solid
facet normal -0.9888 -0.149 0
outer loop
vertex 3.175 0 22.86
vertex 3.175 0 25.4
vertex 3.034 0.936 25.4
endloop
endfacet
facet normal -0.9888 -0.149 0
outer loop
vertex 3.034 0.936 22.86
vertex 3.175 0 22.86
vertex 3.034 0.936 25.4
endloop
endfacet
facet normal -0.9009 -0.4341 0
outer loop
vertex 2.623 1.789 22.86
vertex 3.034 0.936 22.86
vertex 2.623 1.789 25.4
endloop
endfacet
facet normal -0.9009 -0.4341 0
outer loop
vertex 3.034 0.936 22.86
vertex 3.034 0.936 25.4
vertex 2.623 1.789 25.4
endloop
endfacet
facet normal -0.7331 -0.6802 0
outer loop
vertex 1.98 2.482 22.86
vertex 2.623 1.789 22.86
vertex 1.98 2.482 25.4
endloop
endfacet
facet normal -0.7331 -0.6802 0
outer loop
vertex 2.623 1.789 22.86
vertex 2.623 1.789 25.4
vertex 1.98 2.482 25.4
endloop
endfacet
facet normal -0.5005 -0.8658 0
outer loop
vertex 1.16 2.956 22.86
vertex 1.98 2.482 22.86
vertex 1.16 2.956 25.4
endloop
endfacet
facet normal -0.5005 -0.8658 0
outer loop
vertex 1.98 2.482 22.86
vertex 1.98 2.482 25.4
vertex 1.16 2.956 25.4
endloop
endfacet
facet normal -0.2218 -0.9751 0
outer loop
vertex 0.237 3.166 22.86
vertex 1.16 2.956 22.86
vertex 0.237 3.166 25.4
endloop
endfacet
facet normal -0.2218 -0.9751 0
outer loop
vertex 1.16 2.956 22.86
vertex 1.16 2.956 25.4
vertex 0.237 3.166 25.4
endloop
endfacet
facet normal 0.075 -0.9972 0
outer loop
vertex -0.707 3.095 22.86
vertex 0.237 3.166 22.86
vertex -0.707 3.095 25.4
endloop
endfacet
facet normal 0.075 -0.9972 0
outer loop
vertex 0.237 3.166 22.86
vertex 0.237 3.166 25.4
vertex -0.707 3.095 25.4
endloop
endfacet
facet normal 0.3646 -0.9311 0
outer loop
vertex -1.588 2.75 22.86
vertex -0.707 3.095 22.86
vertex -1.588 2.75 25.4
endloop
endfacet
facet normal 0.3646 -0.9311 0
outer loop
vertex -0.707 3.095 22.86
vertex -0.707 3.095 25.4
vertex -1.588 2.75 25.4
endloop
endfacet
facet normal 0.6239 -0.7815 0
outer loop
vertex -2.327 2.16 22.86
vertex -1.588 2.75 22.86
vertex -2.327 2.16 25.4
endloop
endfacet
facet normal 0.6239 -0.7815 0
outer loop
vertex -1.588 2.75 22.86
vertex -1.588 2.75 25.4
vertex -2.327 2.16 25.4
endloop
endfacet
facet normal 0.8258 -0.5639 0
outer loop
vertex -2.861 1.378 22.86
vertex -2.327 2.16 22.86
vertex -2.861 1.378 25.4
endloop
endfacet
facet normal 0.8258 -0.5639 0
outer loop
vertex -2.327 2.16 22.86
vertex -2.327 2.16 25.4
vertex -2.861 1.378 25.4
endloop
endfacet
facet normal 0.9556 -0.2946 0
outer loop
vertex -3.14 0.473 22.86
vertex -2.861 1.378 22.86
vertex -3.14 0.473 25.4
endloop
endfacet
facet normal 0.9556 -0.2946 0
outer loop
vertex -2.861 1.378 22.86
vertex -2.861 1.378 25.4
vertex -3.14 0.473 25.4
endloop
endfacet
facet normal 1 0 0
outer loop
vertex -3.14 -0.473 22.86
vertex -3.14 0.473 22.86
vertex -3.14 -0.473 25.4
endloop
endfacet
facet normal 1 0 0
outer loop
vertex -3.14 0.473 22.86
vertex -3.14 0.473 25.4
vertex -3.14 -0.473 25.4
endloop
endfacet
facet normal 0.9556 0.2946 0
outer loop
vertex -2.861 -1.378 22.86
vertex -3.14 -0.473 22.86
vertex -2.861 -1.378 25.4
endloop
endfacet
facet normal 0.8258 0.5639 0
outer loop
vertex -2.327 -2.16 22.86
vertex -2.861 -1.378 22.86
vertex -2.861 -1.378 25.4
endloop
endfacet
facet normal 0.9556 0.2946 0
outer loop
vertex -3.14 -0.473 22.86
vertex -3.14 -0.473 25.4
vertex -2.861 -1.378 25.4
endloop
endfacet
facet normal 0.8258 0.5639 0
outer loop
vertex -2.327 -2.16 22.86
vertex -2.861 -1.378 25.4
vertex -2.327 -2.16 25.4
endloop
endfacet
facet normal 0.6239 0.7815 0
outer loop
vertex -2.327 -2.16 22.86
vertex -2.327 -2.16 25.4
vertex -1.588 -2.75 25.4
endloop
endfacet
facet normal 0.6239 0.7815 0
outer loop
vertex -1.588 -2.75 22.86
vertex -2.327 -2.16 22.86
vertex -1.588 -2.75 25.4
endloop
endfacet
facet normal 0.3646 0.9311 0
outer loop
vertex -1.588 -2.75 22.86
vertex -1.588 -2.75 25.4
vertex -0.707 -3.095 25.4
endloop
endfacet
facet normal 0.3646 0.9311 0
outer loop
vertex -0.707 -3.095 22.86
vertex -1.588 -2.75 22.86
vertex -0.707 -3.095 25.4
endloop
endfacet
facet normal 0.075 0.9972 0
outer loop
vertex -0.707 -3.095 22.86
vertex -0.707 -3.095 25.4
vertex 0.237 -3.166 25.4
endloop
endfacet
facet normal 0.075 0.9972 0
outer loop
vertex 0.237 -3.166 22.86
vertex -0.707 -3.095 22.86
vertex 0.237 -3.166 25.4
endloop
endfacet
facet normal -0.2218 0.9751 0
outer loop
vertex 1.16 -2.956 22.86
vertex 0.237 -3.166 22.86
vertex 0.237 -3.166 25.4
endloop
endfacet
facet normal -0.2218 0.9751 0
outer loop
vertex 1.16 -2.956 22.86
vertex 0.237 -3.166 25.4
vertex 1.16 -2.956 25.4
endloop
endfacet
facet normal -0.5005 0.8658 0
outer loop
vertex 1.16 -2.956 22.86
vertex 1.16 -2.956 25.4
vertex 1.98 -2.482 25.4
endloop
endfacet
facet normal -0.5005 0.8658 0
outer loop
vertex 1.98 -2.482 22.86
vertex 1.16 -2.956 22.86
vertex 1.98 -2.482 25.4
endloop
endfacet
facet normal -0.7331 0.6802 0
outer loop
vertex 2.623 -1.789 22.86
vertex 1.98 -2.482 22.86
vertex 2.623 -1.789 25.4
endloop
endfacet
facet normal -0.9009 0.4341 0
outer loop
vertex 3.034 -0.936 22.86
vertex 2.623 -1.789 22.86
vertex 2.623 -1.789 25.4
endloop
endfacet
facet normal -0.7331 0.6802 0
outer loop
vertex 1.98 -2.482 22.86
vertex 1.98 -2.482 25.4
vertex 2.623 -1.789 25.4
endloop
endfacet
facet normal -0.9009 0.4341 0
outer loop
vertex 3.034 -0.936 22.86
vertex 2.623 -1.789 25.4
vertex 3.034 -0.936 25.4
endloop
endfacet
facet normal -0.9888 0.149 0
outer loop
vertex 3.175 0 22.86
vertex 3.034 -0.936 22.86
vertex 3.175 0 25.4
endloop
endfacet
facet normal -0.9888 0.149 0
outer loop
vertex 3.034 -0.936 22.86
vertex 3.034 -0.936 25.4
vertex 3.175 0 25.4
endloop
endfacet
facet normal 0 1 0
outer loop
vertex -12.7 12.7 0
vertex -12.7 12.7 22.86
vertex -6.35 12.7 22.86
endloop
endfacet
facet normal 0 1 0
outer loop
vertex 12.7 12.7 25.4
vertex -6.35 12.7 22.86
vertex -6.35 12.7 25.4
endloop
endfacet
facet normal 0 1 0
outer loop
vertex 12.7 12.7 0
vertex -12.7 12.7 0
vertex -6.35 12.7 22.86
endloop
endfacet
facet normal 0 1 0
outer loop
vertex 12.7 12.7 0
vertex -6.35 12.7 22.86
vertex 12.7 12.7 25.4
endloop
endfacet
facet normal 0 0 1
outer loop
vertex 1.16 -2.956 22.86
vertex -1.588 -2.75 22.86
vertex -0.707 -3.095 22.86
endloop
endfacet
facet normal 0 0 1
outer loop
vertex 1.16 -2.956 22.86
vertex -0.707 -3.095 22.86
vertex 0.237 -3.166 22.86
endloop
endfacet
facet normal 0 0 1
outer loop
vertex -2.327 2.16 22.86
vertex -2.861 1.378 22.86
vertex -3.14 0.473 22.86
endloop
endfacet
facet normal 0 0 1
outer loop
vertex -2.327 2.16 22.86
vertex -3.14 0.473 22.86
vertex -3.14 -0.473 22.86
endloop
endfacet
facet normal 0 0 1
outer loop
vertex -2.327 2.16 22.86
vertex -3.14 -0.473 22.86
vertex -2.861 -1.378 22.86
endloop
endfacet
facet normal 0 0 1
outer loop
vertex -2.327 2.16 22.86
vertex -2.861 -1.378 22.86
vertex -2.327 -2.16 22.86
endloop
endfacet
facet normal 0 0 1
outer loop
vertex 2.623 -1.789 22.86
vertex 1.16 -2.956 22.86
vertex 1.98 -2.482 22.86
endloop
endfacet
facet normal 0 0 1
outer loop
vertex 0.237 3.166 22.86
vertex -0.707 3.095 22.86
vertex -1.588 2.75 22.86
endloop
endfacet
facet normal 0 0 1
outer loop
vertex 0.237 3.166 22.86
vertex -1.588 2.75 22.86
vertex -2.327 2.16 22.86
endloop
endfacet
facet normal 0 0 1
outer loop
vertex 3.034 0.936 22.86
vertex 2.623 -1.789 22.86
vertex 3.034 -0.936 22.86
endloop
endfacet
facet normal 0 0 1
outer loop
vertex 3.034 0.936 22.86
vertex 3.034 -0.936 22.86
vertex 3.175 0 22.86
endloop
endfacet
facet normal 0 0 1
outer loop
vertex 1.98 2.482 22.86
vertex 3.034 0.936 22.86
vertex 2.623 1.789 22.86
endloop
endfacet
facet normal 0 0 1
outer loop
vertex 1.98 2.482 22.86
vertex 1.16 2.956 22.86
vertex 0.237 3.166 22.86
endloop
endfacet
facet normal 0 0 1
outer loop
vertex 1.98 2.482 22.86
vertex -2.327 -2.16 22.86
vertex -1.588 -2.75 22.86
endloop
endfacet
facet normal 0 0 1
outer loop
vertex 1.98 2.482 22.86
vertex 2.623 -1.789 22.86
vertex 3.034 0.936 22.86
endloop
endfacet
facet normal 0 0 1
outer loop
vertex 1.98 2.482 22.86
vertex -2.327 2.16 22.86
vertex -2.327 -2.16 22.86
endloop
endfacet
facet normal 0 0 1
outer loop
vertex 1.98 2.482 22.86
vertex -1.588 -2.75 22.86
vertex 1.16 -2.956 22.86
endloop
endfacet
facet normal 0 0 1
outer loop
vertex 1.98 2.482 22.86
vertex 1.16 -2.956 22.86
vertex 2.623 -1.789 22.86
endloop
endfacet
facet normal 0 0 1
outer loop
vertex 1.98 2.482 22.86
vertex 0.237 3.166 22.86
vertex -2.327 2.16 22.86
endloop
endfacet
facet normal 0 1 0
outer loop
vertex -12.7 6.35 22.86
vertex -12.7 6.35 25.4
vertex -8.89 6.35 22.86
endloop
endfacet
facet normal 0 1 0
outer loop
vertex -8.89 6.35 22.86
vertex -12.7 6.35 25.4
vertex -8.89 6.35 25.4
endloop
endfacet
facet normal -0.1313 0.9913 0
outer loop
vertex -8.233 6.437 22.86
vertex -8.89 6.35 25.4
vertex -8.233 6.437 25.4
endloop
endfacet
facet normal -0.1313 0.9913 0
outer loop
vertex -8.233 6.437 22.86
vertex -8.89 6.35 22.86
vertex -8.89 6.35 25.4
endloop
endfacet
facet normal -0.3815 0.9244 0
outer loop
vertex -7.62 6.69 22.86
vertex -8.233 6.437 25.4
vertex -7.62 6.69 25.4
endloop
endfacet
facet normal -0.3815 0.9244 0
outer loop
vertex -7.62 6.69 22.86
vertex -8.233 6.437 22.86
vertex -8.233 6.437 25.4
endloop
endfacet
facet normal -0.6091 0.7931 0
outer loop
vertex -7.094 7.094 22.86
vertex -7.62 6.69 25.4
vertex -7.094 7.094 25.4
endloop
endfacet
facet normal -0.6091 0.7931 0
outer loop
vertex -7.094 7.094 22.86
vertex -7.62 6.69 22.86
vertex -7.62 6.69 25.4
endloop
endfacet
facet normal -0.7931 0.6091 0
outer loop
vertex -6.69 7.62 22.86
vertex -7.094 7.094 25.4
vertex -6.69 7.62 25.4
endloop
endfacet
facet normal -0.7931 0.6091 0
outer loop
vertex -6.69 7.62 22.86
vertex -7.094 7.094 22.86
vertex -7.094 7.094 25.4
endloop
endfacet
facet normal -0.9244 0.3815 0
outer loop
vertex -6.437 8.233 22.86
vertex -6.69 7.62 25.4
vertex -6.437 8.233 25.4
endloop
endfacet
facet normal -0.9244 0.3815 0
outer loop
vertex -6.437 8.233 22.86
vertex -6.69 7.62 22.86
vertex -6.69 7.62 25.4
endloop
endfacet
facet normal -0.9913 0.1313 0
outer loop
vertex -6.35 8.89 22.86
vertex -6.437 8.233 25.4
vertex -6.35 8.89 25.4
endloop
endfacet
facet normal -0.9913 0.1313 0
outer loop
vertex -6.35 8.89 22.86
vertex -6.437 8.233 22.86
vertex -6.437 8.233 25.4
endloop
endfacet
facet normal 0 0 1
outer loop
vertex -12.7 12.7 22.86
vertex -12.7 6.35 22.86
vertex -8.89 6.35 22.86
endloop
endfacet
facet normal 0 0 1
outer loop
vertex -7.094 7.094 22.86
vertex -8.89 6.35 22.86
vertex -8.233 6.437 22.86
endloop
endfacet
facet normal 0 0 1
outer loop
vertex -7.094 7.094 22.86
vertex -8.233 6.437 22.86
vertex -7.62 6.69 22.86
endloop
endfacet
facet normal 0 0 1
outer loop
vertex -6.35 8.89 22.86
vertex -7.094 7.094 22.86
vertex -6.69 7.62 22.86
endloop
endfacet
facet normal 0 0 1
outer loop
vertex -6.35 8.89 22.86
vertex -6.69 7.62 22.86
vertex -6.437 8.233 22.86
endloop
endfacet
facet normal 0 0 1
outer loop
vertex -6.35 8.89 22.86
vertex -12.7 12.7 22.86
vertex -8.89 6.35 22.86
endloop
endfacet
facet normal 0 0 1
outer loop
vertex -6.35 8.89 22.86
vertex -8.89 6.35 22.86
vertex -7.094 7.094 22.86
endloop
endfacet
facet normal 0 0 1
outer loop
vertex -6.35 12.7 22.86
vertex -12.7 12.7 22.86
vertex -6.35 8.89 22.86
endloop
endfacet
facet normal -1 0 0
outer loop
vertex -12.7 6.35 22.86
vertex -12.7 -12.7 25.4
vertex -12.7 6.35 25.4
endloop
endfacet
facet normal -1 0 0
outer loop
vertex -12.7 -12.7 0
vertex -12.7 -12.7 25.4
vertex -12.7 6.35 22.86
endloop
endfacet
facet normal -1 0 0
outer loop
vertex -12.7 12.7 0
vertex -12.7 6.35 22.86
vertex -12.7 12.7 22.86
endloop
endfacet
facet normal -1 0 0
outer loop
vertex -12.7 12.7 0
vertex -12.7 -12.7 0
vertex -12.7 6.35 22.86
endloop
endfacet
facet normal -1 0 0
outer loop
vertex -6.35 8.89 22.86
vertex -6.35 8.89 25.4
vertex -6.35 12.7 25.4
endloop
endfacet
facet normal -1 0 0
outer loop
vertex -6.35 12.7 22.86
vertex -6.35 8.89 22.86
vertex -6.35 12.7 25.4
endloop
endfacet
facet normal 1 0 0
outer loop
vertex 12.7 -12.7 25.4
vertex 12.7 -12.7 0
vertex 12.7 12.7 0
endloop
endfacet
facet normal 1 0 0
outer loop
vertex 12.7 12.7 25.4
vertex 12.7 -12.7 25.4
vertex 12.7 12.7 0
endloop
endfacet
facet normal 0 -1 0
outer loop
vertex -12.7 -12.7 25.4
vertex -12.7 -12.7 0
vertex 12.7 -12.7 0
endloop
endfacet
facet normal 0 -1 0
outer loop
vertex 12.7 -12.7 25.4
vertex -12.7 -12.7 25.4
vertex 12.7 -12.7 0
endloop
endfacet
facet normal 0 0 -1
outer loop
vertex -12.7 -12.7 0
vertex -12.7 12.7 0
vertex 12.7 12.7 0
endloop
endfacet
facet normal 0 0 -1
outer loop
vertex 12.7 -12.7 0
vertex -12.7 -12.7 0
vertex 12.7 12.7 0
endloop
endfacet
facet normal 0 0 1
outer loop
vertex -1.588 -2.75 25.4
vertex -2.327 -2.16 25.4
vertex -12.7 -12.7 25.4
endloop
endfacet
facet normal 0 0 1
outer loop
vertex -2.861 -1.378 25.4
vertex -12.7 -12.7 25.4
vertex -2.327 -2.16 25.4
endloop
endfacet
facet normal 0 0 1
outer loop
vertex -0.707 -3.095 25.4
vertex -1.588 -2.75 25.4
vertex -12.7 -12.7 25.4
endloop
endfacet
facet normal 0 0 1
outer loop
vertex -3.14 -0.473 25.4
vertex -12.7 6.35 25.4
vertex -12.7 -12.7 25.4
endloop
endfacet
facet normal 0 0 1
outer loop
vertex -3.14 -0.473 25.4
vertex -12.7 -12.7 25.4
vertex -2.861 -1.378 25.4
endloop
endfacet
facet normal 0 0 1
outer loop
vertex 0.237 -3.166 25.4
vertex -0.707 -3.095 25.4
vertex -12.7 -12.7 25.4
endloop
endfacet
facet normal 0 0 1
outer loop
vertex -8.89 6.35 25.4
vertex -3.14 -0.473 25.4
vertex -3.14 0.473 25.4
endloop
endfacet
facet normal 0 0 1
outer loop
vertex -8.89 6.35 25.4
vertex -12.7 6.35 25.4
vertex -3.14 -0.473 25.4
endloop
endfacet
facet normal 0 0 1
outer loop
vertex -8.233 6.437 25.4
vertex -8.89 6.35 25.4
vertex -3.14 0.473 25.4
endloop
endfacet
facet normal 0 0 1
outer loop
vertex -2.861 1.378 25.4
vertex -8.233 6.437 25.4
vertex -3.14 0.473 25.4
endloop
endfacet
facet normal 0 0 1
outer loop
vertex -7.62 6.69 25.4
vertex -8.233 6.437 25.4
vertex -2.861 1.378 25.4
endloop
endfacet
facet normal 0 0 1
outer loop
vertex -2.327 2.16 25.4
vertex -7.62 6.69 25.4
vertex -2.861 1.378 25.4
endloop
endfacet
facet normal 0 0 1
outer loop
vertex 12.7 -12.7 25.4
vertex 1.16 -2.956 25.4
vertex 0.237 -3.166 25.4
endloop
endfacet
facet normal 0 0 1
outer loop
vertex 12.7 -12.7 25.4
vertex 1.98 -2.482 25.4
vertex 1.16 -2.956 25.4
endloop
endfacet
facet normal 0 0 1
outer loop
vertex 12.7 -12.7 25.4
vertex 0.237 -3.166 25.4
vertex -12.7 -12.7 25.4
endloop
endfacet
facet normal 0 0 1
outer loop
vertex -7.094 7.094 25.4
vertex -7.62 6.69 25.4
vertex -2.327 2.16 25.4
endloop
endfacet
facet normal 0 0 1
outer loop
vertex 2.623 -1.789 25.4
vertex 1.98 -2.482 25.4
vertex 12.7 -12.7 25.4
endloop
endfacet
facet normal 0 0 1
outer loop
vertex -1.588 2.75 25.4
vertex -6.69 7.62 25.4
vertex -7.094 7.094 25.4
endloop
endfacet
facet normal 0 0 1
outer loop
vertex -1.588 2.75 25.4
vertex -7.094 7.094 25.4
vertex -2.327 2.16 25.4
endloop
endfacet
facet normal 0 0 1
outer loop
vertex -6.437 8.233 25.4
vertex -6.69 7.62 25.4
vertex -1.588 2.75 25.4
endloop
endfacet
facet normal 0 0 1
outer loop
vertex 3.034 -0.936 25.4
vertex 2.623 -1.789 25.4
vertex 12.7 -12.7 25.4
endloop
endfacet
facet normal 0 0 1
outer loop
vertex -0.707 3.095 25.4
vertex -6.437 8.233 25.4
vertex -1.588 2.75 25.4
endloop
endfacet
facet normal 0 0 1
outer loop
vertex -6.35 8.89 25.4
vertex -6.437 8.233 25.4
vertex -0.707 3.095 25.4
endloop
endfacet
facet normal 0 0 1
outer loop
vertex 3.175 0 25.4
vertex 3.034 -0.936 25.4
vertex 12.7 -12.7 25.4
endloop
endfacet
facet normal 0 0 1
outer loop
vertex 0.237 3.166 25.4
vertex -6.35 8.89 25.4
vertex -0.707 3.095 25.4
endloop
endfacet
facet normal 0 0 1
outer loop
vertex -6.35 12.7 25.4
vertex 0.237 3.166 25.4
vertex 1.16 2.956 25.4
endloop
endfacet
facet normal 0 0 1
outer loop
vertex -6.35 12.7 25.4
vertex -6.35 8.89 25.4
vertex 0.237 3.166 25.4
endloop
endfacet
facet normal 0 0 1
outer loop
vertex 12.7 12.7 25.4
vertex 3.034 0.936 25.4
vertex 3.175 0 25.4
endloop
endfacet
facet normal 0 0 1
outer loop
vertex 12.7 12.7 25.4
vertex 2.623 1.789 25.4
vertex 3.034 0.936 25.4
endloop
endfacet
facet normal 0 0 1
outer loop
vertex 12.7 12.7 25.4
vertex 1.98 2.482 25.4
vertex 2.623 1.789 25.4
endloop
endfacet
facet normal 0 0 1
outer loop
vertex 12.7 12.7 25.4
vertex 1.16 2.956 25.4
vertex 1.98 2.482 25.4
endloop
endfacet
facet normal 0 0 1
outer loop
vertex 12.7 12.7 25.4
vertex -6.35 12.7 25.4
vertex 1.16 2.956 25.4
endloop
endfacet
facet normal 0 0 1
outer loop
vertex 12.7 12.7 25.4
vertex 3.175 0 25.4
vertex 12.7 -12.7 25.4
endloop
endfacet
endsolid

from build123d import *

# Parameters (mm, degrees)
F0_W     = 25.4
F0_H     = 25.4
F1_DEPTH = 25.4
F2_W     = 6.35
F2_H     = 6.35
F2_R     = 3.175
F3_DEPTH = 2.54
F4_R     = 2.54


with BuildPart() as f1:
    # F0 (on Top) → F1 (new body)
    with BuildSketch(Plane.XY):
        Rectangle(F0_W, F0_H)
    extrude(amount=F1_DEPTH)

    # F2 (on face) → F3 (cut)
    with BuildSketch(Plane.XY.offset(25.4)):
        with Locations((-9.525, 9.525)):
            Rectangle(F2_W, F2_H)
        Circle(F2_R)
    extrude(amount=-F3_DEPTH, mode=Mode.SUBTRACT)

    # F4
    f4_edges = [f1.edges().sort_by_distance(p)[0] for p in [
        (-6.35, 6.35, 24.13),
    ]]
    fillet(f4_edges, radius=F4_R)


solid = f1.part
